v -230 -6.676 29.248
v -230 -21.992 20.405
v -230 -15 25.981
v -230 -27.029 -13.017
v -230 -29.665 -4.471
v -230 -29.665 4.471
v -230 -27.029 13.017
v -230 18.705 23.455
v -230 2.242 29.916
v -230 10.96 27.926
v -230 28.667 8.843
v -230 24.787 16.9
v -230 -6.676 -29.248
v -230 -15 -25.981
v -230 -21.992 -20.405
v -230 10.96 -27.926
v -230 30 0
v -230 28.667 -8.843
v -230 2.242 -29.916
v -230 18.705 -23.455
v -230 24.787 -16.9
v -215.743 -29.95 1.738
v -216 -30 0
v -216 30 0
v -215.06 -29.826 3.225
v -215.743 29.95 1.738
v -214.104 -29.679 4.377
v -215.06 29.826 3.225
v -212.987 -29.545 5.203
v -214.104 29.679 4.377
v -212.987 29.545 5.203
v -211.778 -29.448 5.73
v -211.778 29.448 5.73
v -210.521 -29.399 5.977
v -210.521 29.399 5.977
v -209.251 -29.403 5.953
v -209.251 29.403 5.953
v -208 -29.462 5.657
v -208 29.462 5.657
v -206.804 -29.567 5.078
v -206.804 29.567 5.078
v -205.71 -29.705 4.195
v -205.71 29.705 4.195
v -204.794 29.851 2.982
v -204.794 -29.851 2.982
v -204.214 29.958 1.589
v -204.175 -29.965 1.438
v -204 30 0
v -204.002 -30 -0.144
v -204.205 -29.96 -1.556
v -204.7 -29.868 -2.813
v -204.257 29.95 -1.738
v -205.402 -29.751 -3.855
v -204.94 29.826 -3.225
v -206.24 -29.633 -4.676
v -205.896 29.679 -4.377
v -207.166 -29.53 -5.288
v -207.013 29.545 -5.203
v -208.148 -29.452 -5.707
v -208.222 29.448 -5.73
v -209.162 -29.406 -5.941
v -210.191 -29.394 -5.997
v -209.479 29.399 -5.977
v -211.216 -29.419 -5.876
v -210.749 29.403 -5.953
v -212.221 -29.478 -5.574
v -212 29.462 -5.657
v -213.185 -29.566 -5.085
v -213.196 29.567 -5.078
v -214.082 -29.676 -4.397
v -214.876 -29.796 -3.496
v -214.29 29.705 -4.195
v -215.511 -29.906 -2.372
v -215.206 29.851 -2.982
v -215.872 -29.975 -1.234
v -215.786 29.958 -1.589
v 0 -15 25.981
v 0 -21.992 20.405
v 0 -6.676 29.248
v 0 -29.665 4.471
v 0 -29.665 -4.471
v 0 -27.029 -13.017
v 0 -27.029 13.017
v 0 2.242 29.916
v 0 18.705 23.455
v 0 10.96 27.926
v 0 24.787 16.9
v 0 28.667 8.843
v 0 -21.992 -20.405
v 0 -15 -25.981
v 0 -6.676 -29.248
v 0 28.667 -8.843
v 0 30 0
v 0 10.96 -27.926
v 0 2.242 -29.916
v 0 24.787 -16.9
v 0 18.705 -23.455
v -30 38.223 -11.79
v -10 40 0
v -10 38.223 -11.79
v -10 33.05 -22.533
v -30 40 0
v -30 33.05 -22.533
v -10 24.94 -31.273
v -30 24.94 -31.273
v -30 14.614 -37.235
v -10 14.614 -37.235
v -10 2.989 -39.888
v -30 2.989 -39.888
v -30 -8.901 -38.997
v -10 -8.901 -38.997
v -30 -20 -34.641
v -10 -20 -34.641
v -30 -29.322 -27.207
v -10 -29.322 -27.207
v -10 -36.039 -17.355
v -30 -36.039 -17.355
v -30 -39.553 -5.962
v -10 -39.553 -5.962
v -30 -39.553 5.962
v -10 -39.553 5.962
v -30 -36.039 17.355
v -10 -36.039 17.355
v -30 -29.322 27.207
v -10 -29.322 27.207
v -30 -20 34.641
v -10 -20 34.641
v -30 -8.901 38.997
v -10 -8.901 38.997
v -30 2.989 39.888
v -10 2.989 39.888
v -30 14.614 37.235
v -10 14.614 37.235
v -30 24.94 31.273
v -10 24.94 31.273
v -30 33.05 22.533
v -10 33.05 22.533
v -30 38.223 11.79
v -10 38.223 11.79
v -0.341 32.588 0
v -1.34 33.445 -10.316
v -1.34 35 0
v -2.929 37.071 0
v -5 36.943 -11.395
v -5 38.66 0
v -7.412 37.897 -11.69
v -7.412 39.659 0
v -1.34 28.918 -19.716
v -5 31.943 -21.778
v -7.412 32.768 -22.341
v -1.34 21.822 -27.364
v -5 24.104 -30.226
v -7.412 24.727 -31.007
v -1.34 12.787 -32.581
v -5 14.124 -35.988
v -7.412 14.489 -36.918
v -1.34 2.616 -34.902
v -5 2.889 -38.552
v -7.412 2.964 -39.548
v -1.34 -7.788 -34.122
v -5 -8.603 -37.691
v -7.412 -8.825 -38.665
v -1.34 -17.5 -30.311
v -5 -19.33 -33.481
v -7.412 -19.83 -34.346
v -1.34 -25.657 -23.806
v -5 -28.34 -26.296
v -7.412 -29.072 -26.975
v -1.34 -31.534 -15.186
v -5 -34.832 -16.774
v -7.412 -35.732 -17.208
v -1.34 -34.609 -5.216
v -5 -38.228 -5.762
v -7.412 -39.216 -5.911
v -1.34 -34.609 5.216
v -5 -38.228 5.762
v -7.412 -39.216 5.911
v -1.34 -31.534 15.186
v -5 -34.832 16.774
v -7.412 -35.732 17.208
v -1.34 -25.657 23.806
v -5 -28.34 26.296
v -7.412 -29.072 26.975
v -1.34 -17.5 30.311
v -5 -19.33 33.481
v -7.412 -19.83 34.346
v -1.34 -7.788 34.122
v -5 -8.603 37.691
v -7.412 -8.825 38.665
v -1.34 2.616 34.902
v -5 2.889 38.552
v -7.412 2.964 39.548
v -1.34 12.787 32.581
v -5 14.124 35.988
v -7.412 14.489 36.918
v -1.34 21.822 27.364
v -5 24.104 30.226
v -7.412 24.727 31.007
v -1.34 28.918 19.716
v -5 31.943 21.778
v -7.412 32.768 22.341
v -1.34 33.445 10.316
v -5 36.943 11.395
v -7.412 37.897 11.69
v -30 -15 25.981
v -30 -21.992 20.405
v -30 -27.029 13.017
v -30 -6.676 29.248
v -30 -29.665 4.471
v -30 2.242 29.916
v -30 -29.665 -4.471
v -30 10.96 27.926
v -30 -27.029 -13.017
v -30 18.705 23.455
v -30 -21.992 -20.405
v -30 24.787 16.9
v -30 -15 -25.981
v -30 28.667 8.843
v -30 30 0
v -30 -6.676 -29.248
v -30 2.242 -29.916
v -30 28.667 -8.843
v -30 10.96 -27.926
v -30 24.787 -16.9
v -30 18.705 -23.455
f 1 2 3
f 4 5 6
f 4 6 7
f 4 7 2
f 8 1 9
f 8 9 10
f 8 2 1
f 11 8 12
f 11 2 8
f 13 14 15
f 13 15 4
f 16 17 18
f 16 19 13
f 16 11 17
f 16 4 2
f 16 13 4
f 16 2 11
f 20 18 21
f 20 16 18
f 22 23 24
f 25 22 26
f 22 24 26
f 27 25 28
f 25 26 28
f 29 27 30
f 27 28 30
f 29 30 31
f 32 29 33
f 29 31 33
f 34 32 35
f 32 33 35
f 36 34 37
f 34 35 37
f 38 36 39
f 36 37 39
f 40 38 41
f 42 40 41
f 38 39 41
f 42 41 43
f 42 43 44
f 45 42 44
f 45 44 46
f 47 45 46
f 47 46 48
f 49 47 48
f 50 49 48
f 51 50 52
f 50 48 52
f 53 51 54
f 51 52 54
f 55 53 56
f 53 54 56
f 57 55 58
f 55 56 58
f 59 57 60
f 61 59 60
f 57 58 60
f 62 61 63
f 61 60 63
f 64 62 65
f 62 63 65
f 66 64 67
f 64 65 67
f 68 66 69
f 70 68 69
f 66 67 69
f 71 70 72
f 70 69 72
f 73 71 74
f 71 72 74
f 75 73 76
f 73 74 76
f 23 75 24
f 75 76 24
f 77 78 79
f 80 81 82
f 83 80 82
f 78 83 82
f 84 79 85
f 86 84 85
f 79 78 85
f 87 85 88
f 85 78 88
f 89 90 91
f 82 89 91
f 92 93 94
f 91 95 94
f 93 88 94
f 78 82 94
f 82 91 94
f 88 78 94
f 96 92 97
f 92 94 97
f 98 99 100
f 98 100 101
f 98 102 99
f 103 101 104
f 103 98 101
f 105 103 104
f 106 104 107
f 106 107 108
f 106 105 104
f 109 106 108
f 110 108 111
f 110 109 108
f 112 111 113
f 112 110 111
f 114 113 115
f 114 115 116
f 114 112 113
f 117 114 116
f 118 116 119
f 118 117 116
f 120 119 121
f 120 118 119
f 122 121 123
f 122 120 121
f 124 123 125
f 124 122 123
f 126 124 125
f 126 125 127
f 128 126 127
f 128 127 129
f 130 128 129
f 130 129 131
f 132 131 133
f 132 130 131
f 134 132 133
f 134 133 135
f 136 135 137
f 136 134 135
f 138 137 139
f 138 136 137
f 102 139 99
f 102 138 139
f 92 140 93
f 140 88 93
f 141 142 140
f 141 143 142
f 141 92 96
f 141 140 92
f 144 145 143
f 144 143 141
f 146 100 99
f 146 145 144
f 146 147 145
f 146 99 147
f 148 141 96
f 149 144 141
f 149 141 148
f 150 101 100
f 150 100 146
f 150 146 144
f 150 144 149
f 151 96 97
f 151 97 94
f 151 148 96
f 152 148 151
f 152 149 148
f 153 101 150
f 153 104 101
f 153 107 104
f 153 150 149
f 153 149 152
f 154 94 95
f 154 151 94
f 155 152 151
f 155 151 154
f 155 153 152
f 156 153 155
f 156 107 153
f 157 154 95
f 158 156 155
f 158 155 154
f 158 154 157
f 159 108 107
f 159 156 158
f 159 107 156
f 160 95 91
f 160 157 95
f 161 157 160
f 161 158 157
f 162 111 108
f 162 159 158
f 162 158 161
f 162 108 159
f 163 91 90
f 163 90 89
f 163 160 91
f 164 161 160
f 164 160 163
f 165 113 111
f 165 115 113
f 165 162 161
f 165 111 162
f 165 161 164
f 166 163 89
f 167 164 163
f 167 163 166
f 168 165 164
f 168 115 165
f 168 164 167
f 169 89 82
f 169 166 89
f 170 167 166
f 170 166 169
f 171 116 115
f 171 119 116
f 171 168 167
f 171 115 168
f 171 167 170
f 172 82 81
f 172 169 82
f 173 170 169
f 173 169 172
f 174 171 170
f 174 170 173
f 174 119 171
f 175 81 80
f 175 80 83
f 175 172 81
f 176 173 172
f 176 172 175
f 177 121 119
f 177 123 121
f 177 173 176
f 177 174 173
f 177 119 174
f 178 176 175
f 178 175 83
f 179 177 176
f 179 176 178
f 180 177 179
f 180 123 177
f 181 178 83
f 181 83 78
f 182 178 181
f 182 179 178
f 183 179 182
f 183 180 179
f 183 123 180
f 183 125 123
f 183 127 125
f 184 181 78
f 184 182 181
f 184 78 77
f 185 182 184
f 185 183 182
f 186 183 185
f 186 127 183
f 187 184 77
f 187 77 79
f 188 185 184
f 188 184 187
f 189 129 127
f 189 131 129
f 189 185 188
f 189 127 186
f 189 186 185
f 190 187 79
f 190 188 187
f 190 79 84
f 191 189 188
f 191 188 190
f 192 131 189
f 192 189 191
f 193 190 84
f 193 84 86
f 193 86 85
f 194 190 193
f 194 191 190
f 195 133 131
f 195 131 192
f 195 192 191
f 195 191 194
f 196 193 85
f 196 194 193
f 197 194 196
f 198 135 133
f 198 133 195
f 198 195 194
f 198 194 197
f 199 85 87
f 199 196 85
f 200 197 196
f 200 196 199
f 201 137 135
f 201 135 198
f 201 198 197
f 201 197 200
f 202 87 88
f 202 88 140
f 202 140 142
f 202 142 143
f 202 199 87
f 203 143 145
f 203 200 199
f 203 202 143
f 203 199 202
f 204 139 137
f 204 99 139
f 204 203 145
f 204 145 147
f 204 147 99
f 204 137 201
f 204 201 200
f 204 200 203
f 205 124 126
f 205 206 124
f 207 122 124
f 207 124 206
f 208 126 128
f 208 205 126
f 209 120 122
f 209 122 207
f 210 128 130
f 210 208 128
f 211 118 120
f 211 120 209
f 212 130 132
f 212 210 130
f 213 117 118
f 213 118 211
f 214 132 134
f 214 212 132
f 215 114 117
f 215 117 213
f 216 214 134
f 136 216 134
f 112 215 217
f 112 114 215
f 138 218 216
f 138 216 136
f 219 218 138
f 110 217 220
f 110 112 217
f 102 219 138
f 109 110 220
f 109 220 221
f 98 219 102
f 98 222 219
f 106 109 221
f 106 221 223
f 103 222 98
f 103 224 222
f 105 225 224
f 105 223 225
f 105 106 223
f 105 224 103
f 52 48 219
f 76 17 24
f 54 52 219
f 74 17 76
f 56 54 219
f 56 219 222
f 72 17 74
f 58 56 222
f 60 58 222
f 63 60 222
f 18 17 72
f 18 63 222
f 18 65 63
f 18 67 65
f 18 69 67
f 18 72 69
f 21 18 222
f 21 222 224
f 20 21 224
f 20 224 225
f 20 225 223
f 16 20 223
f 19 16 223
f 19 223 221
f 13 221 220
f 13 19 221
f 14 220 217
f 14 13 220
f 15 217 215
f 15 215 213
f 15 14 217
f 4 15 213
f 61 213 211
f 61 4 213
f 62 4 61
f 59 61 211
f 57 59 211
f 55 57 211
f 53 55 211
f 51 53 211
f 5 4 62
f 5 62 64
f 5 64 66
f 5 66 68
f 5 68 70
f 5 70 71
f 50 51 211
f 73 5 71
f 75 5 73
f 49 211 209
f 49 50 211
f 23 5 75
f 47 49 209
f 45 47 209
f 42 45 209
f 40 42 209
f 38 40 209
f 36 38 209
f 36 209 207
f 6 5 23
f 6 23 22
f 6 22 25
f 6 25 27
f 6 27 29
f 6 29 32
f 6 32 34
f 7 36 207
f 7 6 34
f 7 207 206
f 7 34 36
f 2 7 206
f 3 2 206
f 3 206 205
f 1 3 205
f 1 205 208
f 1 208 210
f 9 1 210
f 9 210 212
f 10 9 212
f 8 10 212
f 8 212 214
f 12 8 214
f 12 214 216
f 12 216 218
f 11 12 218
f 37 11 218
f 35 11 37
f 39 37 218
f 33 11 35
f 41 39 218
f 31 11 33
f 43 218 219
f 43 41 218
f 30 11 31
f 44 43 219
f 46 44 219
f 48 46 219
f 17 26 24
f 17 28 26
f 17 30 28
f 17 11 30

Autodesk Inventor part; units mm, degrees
ref_plane "YZ Plane" through (0, 0, 0) normal (1, 0, 0) x (0, 1, 0)
ref_plane "XZ Plane" through (0, 0, 0) normal (0, 1, 0) x (-1, 0, 0)
ref_plane "XY Plane" through (0, 0, 0) normal (0, 0, 1) x (1, 0, 0)
sketch "Эскиз1" plane through (0, 0, 0) normal (0, 0, 1) x (1, 0, 0)
  line L0 (0, 0) -> (-282.435, 0)
  line L1 (0, 0) -> (0, 30)
  line L2 (-10, 40) -> (-30, 40)
  line L3 (-30, 40) -> (-30, 30)
  line L4 (-30, 30) -> (-230, 30)
  line L5 (-230, 30) -> (-230, 0)
  arc A0 (0, 30) -> (-10, 40) centre (-10, 30) ccw
  point P0 (0, 40)
  dimension "d0" = 230
  dimension "d1" = 80
  dimension "d2" = 60
  dimension "d3" = 30
  dimension "d4" = 10
revolve "Вращение1" add sketch "Эскиз1" angle 360 about axis through (0, 0, 0) along (-1, 0, 0)
sketch "Эскиз2" plane through (0, 0, 0) normal (0, 1, 0) x (-1, 0, 0)
  line L0 (230, 30) -> (230, -30) projected
  line L1 (30, 30) -> (30, -30) projected
  circle A0 centre (210, 0) radius 6
  point P0 (0, 0)
  point P1 (230, 0)
  dimension "d6" = 12
  dimension "d7" = 20
extrude "Выдавливание1" cut sketch "Эскиз2" against normal through all both and the other way through all
properties part number "Lift.03.00.00.03"
